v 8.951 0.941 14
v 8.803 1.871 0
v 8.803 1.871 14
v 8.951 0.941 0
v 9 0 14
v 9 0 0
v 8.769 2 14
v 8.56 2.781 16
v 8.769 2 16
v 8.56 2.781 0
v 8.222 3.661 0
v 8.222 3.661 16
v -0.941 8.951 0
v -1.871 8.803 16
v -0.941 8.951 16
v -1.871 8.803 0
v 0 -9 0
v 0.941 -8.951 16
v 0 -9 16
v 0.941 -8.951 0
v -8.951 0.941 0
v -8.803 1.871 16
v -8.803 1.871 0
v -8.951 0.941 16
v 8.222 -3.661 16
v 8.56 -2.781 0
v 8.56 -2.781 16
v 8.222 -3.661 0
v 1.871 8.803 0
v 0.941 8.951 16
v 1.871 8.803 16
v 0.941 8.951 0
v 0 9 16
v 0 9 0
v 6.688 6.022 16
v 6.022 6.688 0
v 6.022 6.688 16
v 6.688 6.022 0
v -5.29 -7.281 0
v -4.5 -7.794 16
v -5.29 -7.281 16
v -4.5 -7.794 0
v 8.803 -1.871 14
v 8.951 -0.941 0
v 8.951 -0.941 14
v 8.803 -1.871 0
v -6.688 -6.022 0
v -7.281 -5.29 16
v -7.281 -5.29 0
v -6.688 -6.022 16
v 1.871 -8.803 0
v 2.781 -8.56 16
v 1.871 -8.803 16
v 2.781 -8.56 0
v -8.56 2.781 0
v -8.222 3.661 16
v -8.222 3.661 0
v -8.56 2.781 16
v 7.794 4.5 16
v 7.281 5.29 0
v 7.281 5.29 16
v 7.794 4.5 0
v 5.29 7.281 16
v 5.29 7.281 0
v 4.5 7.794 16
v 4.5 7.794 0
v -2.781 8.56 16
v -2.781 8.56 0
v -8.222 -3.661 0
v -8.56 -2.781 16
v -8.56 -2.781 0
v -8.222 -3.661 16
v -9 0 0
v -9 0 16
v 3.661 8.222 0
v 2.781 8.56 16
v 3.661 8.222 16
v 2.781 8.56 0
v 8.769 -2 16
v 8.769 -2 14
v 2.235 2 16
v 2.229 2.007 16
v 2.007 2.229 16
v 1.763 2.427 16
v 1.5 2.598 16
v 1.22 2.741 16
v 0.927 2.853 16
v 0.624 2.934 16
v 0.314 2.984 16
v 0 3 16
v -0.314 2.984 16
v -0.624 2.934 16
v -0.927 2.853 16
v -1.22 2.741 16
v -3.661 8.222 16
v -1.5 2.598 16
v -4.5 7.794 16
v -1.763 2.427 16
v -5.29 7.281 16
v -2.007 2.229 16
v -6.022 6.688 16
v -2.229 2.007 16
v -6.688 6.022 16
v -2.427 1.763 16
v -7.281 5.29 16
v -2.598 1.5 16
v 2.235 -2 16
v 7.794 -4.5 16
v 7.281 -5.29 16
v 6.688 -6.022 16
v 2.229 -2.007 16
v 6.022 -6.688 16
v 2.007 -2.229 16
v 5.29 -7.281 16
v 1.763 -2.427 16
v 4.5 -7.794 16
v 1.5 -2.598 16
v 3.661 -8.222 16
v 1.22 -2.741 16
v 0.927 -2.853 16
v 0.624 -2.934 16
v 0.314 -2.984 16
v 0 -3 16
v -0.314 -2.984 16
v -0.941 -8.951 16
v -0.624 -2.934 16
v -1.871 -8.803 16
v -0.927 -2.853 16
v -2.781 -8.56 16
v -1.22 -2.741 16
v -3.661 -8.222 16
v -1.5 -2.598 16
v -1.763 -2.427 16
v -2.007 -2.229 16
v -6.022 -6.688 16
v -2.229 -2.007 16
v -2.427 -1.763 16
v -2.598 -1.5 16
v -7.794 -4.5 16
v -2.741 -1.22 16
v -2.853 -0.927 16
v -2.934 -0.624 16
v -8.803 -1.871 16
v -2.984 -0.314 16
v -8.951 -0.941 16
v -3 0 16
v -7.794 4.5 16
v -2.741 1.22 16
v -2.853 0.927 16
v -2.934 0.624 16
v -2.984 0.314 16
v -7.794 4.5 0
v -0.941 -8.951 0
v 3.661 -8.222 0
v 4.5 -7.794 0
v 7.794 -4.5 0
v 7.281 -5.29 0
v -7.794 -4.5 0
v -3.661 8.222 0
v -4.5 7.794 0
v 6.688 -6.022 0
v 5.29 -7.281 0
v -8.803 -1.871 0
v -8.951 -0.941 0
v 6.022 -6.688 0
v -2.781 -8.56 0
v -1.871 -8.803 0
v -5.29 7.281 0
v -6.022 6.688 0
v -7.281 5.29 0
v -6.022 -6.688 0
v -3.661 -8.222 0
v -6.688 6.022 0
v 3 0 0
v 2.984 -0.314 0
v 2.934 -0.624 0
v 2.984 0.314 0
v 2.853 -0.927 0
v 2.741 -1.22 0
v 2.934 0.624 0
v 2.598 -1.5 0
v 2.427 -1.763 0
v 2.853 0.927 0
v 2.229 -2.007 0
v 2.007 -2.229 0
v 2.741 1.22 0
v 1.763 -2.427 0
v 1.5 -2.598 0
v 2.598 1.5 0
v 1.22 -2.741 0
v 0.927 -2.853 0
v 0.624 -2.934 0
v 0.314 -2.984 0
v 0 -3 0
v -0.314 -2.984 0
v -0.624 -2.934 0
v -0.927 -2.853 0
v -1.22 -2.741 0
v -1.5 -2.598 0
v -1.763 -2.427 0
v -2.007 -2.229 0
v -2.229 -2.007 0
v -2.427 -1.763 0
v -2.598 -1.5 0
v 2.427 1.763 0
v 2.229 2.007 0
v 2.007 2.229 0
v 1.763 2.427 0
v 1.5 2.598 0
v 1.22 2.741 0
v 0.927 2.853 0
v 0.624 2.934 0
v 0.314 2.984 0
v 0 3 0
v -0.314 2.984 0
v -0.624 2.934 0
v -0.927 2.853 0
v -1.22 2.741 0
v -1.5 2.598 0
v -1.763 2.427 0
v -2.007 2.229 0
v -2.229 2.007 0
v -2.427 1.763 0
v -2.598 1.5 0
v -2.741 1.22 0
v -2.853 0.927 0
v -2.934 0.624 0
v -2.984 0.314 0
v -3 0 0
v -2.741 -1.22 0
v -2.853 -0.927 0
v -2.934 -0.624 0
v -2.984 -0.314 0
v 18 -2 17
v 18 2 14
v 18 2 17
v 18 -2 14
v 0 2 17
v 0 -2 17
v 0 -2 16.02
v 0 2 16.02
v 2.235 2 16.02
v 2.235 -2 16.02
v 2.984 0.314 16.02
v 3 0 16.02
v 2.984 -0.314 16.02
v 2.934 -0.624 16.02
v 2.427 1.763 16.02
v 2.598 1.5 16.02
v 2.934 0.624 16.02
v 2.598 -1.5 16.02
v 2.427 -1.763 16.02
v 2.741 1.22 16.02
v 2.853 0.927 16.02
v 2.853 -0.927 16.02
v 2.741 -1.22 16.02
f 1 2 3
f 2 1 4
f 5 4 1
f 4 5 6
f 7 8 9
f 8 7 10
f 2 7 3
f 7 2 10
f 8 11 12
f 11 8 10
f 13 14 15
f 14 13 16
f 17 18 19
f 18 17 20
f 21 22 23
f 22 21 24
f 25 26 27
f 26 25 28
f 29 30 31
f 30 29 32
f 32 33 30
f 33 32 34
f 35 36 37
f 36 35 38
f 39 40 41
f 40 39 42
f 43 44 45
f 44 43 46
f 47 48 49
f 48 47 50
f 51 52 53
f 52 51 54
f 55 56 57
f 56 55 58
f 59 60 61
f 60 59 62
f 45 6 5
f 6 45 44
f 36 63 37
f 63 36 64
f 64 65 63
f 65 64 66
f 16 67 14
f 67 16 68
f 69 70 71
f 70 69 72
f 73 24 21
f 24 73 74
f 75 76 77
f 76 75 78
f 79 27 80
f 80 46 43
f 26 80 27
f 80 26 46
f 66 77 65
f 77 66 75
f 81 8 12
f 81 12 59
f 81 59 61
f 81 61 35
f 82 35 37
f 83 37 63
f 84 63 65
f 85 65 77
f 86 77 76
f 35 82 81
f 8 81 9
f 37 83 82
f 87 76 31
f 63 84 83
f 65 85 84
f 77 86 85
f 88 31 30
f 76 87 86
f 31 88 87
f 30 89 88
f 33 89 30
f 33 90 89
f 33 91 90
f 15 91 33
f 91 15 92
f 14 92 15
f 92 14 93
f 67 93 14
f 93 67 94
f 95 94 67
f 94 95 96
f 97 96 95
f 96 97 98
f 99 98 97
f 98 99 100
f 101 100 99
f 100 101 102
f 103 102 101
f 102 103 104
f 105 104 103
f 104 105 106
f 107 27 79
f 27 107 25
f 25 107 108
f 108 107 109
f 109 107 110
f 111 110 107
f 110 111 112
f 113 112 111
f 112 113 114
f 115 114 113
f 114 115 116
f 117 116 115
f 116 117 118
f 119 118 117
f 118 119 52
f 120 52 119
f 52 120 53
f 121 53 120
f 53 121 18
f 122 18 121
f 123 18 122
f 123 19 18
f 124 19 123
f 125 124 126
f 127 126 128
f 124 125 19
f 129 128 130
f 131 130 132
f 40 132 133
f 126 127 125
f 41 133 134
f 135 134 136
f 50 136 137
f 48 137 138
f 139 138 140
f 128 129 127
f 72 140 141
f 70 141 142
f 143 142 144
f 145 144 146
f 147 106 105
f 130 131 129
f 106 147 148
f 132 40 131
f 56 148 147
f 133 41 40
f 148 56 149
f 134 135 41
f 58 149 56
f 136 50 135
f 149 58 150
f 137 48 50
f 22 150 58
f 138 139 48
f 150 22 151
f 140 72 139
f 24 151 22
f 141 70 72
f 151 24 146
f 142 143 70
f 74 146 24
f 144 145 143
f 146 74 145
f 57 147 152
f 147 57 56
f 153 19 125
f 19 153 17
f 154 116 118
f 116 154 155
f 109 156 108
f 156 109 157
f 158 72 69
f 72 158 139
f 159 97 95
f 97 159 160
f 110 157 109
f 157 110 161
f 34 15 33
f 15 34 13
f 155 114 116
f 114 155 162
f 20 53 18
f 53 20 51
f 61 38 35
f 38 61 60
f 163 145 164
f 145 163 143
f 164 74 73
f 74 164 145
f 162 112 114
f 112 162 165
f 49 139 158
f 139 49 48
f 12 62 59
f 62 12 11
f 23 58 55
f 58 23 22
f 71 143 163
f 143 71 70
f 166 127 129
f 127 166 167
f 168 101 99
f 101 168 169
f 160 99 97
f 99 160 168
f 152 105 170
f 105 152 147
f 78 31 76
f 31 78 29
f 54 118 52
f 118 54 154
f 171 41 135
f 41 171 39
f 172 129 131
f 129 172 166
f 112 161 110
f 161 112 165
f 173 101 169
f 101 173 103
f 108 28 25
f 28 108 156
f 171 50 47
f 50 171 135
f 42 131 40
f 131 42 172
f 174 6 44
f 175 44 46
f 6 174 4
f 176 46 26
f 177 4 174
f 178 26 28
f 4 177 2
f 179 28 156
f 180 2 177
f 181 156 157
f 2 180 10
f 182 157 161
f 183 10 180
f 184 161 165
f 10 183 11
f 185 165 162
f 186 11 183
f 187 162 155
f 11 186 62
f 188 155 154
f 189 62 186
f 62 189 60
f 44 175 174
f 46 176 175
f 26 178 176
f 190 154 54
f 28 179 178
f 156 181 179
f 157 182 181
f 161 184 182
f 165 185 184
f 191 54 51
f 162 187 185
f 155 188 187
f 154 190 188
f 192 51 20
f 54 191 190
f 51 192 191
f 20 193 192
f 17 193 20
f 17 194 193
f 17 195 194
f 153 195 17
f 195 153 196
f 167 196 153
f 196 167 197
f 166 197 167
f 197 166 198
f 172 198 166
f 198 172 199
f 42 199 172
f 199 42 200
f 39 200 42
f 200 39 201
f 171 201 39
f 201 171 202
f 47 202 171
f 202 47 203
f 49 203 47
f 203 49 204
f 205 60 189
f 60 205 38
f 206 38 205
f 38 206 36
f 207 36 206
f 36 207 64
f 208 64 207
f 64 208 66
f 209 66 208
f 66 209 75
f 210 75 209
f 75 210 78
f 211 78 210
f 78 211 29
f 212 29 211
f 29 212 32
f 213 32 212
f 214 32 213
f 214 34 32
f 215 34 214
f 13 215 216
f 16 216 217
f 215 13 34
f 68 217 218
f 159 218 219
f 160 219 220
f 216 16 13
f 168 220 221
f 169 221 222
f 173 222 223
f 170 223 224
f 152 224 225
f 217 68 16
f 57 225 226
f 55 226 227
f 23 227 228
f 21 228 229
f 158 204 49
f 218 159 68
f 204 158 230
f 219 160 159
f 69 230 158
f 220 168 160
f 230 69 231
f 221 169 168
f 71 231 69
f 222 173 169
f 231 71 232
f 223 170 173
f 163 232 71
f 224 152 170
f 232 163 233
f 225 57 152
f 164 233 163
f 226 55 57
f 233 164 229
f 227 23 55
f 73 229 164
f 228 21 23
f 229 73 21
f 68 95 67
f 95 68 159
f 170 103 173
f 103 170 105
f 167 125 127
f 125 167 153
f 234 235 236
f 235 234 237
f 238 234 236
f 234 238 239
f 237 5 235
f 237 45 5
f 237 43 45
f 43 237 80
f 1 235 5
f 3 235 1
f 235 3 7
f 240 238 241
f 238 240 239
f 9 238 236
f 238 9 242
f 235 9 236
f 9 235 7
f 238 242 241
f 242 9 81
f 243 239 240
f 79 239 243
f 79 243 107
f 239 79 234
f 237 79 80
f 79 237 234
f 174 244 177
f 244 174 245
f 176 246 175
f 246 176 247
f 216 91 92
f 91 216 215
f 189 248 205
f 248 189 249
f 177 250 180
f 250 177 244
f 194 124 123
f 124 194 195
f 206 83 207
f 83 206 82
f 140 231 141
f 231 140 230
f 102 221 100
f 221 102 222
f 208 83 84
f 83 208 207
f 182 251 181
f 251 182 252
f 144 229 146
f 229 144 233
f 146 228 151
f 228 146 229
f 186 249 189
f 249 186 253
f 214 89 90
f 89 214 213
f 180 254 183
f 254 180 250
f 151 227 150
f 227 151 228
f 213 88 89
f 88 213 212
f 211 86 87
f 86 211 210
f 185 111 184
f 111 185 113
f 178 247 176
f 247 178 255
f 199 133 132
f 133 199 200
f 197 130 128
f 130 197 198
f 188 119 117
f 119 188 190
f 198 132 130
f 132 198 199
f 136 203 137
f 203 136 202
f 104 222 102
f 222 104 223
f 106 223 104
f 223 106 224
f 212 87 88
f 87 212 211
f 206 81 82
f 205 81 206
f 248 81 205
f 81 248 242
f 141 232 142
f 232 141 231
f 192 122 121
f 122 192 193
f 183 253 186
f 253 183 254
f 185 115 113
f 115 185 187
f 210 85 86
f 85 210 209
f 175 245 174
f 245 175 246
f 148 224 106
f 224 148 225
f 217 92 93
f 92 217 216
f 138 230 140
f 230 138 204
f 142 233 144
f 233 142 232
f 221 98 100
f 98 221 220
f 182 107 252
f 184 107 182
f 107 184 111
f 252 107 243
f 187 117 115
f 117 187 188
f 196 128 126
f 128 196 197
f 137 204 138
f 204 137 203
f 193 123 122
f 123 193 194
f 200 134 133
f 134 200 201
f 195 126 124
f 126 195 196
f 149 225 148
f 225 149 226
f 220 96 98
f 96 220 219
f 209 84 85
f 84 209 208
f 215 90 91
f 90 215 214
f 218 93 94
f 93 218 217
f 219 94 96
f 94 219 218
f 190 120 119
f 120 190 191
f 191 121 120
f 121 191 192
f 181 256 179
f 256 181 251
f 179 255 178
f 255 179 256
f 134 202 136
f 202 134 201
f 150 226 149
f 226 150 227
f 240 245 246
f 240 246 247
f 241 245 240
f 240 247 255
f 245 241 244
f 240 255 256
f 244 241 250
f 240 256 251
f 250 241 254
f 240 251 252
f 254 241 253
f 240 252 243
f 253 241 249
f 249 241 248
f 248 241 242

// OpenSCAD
// Quarter-turn cam lock.
$fn = 60;
eps = 0.02;
body_d = 18;
body_l = 16;
arm_l = 18;
difference() { union() { cylinder(d=body_d,h=body_l); translate([0,-2,body_l-2]) cube([arm_l,4,3]); } translate([0,0,-eps]) cylinder(d=6,h=body_l+2*eps); }
